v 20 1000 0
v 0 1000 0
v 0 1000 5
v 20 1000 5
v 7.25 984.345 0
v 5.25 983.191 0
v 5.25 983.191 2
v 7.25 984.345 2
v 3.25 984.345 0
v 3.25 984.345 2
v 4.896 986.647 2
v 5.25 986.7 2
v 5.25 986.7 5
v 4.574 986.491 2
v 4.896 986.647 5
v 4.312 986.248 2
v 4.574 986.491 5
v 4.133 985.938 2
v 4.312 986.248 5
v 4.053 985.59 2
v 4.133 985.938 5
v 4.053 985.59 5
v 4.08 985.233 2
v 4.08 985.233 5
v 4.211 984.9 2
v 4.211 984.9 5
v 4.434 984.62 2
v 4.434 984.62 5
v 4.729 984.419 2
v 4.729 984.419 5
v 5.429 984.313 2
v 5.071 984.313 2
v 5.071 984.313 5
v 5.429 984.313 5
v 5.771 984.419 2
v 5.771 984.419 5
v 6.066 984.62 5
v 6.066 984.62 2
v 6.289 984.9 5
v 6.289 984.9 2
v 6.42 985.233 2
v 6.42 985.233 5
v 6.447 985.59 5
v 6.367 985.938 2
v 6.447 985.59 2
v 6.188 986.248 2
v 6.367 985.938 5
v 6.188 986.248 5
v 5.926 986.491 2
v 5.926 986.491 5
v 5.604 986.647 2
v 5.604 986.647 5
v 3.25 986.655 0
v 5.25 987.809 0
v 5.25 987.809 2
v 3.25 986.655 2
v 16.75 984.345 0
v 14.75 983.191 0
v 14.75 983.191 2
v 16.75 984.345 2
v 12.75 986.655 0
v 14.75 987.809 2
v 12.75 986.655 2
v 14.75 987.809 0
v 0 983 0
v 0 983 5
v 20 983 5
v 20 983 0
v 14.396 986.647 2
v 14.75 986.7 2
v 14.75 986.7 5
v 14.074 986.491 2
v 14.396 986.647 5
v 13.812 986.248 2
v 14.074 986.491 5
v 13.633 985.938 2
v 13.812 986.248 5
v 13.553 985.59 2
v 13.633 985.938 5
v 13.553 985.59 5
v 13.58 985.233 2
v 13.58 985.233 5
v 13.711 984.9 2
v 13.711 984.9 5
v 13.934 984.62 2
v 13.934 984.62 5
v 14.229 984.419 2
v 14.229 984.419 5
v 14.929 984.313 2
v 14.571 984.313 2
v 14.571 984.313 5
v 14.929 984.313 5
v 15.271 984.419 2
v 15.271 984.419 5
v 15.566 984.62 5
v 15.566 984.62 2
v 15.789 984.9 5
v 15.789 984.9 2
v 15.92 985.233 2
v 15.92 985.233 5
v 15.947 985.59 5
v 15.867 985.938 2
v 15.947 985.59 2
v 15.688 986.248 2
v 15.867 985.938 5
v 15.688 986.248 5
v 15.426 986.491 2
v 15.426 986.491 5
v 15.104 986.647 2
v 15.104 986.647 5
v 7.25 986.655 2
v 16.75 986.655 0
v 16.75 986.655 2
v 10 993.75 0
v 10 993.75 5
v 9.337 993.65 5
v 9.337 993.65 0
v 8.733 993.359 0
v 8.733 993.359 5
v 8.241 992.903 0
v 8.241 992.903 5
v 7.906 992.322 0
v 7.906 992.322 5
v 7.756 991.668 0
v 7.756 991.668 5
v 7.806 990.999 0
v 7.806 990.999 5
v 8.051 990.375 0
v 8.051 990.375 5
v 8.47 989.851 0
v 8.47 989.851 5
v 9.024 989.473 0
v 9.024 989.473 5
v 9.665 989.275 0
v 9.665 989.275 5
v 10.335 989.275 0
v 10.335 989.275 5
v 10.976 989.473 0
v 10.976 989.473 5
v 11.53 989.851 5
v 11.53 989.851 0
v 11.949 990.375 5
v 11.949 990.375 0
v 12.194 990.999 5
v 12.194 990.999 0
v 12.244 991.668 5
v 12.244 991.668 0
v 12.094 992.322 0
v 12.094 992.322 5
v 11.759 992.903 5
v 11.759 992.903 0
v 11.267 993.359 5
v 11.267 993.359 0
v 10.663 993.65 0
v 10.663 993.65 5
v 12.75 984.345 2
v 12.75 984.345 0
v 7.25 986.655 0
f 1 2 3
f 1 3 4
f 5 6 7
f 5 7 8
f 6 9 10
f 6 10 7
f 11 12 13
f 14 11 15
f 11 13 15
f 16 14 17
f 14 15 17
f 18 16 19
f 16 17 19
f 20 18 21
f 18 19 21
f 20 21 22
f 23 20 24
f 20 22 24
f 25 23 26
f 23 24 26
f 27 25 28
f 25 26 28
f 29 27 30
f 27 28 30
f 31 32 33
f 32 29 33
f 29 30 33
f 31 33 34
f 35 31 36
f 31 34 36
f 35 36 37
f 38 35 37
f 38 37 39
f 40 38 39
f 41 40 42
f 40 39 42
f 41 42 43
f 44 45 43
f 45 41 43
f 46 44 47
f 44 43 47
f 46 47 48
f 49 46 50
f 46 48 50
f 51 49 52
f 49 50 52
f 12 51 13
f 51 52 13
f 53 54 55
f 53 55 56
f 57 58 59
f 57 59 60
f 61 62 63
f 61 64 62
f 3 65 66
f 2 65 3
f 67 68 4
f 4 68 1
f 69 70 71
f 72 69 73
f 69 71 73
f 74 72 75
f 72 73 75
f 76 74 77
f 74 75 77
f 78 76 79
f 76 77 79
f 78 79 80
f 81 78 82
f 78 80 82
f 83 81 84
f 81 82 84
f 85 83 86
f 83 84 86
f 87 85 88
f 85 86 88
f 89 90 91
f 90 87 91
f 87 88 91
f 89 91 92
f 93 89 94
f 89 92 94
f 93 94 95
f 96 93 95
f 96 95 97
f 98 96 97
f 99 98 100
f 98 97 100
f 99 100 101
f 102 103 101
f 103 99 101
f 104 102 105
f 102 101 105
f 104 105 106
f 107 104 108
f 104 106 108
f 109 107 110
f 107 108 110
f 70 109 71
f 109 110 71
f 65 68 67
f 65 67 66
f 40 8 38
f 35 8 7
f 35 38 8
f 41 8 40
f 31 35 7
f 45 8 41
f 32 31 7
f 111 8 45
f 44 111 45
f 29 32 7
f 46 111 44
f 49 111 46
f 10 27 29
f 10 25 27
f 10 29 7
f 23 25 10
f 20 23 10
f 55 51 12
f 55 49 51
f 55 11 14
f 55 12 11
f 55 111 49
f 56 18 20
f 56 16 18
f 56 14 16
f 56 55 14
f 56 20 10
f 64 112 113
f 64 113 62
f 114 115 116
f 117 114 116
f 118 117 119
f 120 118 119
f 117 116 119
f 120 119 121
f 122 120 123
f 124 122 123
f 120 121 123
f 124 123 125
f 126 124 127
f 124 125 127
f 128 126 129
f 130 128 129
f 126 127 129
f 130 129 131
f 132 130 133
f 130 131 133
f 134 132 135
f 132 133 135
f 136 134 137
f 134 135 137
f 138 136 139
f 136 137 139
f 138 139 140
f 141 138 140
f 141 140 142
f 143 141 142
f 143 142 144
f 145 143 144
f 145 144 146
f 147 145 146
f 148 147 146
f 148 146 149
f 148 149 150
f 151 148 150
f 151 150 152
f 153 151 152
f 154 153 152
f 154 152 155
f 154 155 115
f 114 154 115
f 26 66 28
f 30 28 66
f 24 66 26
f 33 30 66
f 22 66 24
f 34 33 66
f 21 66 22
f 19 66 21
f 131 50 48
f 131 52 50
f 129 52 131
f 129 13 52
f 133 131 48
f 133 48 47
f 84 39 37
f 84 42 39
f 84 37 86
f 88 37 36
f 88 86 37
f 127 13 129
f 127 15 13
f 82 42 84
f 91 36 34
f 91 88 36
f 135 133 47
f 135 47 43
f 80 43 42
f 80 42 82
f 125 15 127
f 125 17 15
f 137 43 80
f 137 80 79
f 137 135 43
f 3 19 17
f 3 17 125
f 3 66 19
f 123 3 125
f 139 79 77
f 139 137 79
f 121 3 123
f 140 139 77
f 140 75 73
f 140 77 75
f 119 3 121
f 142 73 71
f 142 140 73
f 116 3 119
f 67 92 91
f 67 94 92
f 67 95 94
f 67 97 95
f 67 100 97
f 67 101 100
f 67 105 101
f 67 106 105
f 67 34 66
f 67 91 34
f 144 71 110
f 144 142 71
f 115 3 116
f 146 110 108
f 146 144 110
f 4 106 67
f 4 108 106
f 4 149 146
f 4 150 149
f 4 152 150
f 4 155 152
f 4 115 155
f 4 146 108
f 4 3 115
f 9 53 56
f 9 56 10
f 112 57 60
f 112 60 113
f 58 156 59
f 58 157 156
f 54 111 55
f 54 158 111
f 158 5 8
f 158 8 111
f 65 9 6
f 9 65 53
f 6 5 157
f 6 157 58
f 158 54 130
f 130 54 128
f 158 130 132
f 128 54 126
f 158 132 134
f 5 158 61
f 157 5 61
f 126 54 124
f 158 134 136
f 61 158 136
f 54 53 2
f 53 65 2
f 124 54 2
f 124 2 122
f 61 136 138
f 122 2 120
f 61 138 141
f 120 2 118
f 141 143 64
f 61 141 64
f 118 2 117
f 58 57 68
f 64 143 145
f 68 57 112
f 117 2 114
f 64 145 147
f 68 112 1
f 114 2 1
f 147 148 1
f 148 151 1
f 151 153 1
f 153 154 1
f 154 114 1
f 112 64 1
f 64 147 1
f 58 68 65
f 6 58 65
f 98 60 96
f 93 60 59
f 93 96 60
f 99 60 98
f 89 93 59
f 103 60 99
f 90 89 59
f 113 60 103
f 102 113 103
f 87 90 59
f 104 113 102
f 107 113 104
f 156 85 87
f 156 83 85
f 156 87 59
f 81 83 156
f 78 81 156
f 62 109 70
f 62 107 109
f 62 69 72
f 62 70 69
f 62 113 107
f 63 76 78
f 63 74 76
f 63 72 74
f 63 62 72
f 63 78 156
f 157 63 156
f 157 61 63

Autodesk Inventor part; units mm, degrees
ref_plane "YZ Plane" through (0, 0, 0) normal (1, 0, 0) x (0, 1, 0)
ref_plane "XZ Plane" through (0, 0, 0) normal (0, 1, 0) x (-1, 0, 0)
ref_plane "XY Plane" through (0, 0, 0) normal (0, 0, 1) x (1, 0, 0)
ref_plane "Work Plane1" through (0, 0, 0) normal (0, 0, 1) x (1, 0, 0)
sketch "Sketch1" plane through (0, 0, 0) normal (0, 0, 1) x (1, 0, 0)
  line L0 (0, 750) -> (7, 750) projected
  line L1 (7, 750) -> (7, 1000) projected
  line L2 (0, 1000) -> (7, 1000) projected
  line L3 (0, 750) -> (0, 1000) projected
  line L4 (13, 750) -> (20, 750) projected
  line L5 (20, 750) -> (20, 1000) projected
  line L6 (13, 1000) -> (20, 1000) projected
  line L7 (13, 750) -> (13, 1000) projected
  line L8 (0, 1000) -> (20, 1000)
  line L9 (20, 1000) -> (20, 983)
  line L10 (20, 983) -> (0, 983)
  line L11 (0, 983) -> (0, 1000)
  line L12 (10, 1000) -> (10, 983) construction
  circle A0 centre (10, 991.5) radius 4.5 construction
  line L13 (0, 985.5) -> (20, 985.5) construction
  point P0 (0, 0)
  point P1 (5.25, 985.5)
  point P2 (14.75, 985.5)
  point P3 (0, 983)
  dimension "d0" = 9
  dimension "d3" = 9.5
  dimension "d4" = 2.5
  dimension "d5" = 17
extrude "Extrusion1" add sketch "Sketch1" along normal blind 5 contours L3 L2 L1 L10 | L1 L8 L7 L10 | L7 L6 L5 L10
hole "Hole1" at (5.25, 985.5, 0) at (14.75, 985.5, 0) direction (0, 0, 1) diameter 2.4 end through all clearance for "Hex Head Bolt / Nut GOST 12876-67" size "M2" standard "GOST"
hole "Hole2" at (10, 991.5, 0) direction (0, 0, 1) diameter 4.5 end through all clearance for "Hex Head Bolt / Nut GOST 12876-67" size "M4" standard "GOST"
sketch "Sketch2" plane through (0, 0, 0) normal (0, 0, -1) x (-1, 0, 0)
  circle A0 centre (-14.75, 985.5) radius 1.2 projected
  circle A1 centre (-5.25, 985.5) radius 1.2 projected
  line L0 (-12.75, 984.3453) -> (-14.75, 983.1906)
  line L1 (-14.75, 983.1906) -> (-16.75, 984.3453)
  line L2 (-16.75, 984.3453) -> (-16.75, 986.6547)
  line L3 (-16.75, 986.6547) -> (-14.75, 987.8094)
  line L4 (-14.75, 987.8094) -> (-12.75, 986.6547)
  line L5 (-12.75, 986.6547) -> (-12.75, 984.3453)
  line L6 (-7.25, 984.3453) -> (-7.25, 986.6547)
  line L7 (-7.25, 986.6547) -> (-5.25, 987.8094)
  line L8 (-5.25, 987.8094) -> (-3.25, 986.6547)
  line L9 (-3.25, 986.6547) -> (-3.25, 984.3453)
  line L10 (-3.25, 984.3453) -> (-5.25, 983.1906)
  line L11 (-5.25, 983.1906) -> (-7.25, 984.3453)
  line L12 (-20, 983) -> (-20, 1000) projected
  point P0 (0, 0)
  dimension "d22" = 4
extrude "Extrusion2" cut sketch "Sketch2" against normal blind 2
properties part number "ender"
